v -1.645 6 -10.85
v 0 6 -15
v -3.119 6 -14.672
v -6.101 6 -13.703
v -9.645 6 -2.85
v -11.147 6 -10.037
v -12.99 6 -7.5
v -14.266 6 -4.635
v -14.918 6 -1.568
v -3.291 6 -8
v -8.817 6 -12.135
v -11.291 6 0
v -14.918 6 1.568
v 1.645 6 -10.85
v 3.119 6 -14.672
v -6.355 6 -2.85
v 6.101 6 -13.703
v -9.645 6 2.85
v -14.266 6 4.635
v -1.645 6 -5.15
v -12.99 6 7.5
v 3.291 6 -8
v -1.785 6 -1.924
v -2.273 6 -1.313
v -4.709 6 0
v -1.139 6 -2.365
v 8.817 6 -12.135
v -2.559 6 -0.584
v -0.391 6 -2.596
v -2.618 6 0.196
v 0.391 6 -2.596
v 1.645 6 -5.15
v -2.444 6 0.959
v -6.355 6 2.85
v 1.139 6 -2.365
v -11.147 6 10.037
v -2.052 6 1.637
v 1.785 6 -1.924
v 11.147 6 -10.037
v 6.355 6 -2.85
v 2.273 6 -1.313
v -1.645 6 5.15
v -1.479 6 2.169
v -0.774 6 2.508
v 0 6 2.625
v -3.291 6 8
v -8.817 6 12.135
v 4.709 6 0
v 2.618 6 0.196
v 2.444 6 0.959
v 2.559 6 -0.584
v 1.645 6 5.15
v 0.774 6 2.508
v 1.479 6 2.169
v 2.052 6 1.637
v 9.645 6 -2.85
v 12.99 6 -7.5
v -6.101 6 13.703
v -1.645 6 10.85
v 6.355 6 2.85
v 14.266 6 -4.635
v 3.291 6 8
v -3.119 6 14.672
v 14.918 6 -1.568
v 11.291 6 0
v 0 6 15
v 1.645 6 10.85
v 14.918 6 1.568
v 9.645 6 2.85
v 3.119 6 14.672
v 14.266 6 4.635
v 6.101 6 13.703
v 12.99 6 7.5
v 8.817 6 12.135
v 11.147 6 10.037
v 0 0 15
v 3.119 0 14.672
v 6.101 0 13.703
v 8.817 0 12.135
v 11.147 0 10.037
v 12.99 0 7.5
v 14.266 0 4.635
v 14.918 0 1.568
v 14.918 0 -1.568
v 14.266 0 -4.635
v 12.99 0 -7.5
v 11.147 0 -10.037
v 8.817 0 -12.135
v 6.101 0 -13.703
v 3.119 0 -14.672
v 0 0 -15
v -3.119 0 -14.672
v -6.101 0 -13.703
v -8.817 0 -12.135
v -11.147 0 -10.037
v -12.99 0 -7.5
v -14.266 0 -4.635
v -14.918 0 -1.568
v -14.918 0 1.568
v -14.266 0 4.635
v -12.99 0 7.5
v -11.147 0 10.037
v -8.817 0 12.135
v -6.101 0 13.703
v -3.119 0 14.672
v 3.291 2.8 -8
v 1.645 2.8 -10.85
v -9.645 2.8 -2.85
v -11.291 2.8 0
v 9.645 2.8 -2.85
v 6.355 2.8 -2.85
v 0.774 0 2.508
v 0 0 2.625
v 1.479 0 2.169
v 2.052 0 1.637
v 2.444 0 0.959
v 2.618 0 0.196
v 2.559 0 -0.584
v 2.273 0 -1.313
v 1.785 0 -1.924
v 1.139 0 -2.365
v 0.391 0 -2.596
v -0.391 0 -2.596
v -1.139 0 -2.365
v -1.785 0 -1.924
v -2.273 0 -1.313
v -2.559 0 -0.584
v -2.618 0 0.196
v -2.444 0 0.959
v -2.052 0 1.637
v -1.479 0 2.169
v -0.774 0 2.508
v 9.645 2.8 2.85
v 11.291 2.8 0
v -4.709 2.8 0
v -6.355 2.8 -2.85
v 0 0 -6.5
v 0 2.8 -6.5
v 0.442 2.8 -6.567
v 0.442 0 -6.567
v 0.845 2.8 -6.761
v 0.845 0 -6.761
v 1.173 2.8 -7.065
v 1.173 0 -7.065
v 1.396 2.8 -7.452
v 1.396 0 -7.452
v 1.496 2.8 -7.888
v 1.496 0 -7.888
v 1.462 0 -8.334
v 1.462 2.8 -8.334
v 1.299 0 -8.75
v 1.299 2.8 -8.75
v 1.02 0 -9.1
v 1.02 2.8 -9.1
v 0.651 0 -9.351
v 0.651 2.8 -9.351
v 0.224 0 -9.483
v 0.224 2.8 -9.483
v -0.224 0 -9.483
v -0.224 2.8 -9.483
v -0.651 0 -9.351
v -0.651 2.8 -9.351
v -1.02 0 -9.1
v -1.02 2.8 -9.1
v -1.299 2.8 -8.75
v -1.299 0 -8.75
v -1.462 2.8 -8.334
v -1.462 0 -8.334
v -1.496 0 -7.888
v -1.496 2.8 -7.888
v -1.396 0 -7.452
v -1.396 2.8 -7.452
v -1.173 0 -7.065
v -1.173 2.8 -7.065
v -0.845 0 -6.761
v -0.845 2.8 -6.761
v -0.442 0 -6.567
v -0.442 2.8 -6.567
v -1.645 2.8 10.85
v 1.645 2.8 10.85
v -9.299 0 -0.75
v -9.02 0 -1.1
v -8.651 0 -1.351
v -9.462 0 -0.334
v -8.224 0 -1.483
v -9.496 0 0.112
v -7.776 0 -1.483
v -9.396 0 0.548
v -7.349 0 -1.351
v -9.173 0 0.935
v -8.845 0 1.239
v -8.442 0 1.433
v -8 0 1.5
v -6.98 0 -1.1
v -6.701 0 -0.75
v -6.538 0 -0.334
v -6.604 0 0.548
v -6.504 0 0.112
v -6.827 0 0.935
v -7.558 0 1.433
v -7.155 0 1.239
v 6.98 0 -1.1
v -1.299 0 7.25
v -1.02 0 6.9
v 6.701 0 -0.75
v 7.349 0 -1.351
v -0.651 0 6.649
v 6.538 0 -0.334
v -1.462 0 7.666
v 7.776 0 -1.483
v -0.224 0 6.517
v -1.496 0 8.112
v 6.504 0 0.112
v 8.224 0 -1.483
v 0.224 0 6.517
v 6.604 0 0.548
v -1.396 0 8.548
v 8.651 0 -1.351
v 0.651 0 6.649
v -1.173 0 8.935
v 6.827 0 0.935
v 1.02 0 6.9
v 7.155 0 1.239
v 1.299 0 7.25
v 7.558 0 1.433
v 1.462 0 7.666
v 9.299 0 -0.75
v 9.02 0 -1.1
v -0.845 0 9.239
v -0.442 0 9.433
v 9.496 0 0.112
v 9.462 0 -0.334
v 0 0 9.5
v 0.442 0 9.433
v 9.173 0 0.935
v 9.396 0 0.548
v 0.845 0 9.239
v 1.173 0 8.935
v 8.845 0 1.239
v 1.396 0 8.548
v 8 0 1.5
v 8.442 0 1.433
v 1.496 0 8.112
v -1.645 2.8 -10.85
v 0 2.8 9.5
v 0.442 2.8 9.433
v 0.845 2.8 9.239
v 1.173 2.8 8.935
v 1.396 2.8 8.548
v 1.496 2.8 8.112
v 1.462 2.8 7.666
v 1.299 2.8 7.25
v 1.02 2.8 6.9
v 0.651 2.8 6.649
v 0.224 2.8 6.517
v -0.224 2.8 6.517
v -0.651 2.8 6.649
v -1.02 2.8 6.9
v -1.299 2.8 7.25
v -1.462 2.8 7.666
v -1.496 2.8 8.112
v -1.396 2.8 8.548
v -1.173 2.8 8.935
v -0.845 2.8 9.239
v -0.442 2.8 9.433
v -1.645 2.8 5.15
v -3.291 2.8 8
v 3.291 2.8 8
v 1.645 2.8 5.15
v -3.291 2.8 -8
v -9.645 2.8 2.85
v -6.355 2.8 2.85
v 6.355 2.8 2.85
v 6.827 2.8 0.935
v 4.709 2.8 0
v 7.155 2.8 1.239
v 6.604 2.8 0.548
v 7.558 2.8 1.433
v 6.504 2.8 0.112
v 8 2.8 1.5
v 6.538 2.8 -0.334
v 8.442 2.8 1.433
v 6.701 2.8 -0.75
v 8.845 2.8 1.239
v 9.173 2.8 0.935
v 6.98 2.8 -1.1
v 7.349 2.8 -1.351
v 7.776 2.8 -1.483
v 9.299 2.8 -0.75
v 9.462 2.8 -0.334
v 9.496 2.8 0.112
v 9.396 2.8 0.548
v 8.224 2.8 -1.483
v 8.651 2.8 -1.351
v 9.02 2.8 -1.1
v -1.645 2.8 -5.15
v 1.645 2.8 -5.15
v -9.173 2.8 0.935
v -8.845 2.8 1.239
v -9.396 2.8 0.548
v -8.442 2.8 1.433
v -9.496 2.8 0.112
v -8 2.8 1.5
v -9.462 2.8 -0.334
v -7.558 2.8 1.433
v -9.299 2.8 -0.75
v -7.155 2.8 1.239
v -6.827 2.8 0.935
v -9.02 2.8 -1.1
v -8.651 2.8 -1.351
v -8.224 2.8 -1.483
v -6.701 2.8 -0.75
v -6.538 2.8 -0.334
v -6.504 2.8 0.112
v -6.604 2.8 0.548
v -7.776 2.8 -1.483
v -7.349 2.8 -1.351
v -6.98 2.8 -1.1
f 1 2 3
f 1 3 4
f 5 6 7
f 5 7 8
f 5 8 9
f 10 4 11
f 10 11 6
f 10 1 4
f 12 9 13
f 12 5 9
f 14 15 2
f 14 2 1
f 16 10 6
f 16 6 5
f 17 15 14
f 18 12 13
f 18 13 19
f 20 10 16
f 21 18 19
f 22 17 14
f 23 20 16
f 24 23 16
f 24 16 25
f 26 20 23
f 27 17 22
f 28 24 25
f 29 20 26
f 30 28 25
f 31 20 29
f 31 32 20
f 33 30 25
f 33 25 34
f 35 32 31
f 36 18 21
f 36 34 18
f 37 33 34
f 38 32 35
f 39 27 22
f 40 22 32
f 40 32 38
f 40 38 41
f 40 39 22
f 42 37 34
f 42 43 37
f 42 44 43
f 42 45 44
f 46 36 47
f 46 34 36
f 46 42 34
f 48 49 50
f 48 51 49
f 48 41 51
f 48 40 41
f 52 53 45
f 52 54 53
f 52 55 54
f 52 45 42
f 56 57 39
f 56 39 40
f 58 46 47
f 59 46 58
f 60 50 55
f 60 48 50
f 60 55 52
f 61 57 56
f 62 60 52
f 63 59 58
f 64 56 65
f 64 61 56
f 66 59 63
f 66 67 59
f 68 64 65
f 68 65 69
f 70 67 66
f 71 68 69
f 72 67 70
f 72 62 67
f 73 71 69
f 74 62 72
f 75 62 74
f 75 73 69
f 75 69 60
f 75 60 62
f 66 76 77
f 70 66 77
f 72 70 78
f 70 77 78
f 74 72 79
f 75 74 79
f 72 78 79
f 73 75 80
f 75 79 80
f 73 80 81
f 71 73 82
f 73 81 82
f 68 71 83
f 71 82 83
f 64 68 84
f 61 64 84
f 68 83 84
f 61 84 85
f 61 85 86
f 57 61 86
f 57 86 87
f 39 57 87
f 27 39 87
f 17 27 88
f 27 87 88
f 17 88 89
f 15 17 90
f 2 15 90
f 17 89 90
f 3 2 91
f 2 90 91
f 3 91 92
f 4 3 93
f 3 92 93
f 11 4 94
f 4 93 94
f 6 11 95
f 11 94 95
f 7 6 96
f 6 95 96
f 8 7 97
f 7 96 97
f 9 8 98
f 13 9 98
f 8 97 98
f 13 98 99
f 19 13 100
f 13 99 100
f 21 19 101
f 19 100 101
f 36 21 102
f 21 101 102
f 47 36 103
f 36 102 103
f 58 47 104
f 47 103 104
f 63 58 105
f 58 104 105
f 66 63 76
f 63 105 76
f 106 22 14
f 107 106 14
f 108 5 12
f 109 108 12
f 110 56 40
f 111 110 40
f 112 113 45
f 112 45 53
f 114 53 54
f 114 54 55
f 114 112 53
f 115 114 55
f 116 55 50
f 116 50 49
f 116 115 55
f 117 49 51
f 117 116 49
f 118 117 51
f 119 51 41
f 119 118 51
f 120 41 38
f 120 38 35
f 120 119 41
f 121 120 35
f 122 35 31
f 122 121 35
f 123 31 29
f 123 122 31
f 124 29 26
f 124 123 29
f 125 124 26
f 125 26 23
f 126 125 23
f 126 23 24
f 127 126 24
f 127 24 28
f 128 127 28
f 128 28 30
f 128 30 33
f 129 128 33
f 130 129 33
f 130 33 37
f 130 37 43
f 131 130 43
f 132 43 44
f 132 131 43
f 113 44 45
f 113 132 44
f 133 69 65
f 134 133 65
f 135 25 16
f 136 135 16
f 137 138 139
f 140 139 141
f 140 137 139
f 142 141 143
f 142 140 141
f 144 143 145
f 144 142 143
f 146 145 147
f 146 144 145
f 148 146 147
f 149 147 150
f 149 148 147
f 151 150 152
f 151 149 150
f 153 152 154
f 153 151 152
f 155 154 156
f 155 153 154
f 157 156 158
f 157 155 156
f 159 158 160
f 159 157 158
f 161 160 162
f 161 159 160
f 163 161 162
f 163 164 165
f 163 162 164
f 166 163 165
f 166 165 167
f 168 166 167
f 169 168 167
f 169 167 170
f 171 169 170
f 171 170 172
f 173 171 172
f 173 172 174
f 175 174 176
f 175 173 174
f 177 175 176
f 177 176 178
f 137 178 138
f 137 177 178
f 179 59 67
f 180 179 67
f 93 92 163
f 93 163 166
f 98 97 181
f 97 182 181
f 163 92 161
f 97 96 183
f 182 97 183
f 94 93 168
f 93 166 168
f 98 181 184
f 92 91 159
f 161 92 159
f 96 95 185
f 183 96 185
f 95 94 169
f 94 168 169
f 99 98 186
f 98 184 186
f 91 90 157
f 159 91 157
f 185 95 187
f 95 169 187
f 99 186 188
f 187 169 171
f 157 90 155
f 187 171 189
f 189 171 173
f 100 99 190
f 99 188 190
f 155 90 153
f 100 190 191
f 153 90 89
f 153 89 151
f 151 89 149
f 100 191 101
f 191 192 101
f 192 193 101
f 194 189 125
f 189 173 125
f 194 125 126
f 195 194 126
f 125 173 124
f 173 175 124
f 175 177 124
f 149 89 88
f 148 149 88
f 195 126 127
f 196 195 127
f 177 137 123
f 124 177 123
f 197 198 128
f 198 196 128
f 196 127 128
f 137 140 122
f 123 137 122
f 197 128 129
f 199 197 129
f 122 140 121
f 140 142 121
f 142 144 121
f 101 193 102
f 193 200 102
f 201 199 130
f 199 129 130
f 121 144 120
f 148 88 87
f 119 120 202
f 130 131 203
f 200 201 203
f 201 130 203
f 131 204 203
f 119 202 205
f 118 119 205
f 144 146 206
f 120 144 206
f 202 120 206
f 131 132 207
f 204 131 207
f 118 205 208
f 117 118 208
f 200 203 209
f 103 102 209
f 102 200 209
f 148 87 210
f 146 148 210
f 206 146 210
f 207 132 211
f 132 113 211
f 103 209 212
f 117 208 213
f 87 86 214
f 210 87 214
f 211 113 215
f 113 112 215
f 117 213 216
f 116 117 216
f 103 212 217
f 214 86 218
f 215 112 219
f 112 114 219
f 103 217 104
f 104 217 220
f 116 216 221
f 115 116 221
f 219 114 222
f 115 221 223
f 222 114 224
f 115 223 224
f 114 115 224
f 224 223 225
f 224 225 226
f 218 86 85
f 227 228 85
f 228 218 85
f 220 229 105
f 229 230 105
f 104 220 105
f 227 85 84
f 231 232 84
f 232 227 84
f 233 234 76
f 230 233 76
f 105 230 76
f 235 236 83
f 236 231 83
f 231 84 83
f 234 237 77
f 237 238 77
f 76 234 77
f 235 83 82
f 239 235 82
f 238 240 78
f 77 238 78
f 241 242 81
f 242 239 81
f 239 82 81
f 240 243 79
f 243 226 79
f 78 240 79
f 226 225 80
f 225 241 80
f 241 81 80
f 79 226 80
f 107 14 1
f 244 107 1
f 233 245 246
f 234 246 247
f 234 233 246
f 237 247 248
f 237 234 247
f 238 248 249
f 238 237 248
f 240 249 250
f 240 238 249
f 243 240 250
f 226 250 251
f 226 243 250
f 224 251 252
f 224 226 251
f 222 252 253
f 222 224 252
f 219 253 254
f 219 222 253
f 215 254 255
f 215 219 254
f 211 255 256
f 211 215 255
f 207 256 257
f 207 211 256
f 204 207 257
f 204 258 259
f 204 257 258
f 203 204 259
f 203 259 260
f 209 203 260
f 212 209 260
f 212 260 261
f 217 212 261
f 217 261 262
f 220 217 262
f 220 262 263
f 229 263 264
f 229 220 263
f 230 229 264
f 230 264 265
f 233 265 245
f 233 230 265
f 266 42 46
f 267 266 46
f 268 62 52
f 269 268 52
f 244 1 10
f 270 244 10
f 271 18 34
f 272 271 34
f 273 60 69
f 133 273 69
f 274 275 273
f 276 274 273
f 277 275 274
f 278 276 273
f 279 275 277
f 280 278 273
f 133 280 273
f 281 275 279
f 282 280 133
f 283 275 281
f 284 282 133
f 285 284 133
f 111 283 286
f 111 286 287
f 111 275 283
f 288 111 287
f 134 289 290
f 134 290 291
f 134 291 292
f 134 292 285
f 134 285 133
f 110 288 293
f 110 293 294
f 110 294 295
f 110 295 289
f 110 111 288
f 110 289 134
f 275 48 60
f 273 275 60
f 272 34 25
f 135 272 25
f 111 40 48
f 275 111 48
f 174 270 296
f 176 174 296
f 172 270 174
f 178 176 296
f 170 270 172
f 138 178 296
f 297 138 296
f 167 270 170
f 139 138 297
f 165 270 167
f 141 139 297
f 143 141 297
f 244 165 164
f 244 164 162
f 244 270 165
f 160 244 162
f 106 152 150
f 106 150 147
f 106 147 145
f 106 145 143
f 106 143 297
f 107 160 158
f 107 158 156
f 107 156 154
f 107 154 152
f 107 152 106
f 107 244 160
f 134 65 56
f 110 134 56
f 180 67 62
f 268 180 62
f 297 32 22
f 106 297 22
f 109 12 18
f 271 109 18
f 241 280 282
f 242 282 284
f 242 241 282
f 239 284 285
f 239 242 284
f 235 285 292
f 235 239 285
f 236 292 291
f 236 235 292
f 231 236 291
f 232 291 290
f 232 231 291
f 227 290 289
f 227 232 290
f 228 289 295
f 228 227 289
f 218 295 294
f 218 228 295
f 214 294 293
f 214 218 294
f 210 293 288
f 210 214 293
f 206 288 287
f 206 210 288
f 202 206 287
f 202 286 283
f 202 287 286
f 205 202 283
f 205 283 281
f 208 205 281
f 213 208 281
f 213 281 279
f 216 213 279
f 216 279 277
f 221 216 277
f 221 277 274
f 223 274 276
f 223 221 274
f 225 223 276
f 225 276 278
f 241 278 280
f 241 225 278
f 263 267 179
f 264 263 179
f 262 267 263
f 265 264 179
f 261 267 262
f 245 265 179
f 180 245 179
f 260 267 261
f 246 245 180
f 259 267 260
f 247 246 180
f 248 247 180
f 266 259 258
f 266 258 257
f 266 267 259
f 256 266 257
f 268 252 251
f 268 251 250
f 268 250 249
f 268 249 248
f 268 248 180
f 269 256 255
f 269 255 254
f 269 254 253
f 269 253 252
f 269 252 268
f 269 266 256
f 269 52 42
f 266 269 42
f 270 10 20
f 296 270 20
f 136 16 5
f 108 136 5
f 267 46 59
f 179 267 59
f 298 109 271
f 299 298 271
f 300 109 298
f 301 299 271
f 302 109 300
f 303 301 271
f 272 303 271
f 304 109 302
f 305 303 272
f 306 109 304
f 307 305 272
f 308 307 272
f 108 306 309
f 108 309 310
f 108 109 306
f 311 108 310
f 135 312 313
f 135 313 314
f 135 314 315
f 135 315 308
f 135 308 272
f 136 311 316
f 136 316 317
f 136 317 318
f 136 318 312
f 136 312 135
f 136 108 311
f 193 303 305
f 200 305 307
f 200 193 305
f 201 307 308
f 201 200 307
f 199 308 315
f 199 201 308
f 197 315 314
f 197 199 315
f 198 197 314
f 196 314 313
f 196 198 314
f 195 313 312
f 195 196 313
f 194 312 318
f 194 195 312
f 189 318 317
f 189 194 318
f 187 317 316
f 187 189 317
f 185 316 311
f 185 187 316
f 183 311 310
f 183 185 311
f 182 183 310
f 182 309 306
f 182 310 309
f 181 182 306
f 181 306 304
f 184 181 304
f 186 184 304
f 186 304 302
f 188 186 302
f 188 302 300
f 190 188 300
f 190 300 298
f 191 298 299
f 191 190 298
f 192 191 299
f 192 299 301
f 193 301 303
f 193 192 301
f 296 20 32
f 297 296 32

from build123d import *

# Parameters (mm, degrees)
SKETCH1_R           = 15
SKETCH1_R_2         = 1.5
SKETCH1_R_3         = 2.625
BOSS_EXTRUDE1_DEPTH = 6
CUT_EXTRUDE1_DEPTH  = 3.2


with BuildPart() as part:
    # Sketch1 → Boss-Extrude1 (new body)
    with BuildSketch(Plane(origin=(0, 0, 0), x_dir=(1, 0, 0), z_dir=(0, 1, 0))):
        with Locations(Location((0, 0, 0), (0, 0, 270))):
            Circle(SKETCH1_R)
        with Locations(Location((0, 8, 0), (0, 0, 270))):
            Circle(SKETCH1_R_2, mode=Mode.SUBTRACT)
        with Locations(Location((8, 0, 0), (0, 0, 270))):
            Circle(SKETCH1_R_2, mode=Mode.SUBTRACT)
        with Locations(Location((0, -8, 0), (0, 0, 270))):
            Circle(SKETCH1_R_2, mode=Mode.SUBTRACT)
        with Locations(Location((-8, 0, 0), (0, 0, 270))):
            Circle(SKETCH1_R_2, mode=Mode.SUBTRACT)
        with Locations(Location((0, 0, 0), (0, 0, 270))):
            Circle(SKETCH1_R_3, mode=Mode.SUBTRACT)
    extrude(amount=BOSS_EXTRUDE1_DEPTH)

    # Sketch2 → Cut-Extrude1 (cut)
    with BuildSketch(Plane(origin=(0, 6, 0), x_dir=(1, 0, 0), z_dir=(0, 1, 0))):
        Polygon((3.290896534, 8), (1.645448267, 10.85), (-1.645448267, 10.85), (-3.290896534, 8), (-1.645448267, 5.15), (1.645448267, 5.15), align=None)
        Polygon((11.290896534, 0), (9.645448267, 2.85), (6.354551733, 2.85), (4.709103466, 0), (6.354551733, -2.85), (9.645448267, -2.85), align=None)
        Polygon((-4.709103466, 0), (-6.354551733, 2.85), (-9.645448267, 2.85), (-11.290896534, 0), (-9.645448267, -2.85), (-6.354551733, -2.85), align=None)
        Polygon((3.290896534, -8), (1.645448267, -5.15), (-1.645448267, -5.15), (-3.290896534, -8), (-1.645448267, -10.85), (1.645448267, -10.85), align=None)
    extrude(amount=-CUT_EXTRUDE1_DEPTH, mode=Mode.SUBTRACT)


solid = part.part
